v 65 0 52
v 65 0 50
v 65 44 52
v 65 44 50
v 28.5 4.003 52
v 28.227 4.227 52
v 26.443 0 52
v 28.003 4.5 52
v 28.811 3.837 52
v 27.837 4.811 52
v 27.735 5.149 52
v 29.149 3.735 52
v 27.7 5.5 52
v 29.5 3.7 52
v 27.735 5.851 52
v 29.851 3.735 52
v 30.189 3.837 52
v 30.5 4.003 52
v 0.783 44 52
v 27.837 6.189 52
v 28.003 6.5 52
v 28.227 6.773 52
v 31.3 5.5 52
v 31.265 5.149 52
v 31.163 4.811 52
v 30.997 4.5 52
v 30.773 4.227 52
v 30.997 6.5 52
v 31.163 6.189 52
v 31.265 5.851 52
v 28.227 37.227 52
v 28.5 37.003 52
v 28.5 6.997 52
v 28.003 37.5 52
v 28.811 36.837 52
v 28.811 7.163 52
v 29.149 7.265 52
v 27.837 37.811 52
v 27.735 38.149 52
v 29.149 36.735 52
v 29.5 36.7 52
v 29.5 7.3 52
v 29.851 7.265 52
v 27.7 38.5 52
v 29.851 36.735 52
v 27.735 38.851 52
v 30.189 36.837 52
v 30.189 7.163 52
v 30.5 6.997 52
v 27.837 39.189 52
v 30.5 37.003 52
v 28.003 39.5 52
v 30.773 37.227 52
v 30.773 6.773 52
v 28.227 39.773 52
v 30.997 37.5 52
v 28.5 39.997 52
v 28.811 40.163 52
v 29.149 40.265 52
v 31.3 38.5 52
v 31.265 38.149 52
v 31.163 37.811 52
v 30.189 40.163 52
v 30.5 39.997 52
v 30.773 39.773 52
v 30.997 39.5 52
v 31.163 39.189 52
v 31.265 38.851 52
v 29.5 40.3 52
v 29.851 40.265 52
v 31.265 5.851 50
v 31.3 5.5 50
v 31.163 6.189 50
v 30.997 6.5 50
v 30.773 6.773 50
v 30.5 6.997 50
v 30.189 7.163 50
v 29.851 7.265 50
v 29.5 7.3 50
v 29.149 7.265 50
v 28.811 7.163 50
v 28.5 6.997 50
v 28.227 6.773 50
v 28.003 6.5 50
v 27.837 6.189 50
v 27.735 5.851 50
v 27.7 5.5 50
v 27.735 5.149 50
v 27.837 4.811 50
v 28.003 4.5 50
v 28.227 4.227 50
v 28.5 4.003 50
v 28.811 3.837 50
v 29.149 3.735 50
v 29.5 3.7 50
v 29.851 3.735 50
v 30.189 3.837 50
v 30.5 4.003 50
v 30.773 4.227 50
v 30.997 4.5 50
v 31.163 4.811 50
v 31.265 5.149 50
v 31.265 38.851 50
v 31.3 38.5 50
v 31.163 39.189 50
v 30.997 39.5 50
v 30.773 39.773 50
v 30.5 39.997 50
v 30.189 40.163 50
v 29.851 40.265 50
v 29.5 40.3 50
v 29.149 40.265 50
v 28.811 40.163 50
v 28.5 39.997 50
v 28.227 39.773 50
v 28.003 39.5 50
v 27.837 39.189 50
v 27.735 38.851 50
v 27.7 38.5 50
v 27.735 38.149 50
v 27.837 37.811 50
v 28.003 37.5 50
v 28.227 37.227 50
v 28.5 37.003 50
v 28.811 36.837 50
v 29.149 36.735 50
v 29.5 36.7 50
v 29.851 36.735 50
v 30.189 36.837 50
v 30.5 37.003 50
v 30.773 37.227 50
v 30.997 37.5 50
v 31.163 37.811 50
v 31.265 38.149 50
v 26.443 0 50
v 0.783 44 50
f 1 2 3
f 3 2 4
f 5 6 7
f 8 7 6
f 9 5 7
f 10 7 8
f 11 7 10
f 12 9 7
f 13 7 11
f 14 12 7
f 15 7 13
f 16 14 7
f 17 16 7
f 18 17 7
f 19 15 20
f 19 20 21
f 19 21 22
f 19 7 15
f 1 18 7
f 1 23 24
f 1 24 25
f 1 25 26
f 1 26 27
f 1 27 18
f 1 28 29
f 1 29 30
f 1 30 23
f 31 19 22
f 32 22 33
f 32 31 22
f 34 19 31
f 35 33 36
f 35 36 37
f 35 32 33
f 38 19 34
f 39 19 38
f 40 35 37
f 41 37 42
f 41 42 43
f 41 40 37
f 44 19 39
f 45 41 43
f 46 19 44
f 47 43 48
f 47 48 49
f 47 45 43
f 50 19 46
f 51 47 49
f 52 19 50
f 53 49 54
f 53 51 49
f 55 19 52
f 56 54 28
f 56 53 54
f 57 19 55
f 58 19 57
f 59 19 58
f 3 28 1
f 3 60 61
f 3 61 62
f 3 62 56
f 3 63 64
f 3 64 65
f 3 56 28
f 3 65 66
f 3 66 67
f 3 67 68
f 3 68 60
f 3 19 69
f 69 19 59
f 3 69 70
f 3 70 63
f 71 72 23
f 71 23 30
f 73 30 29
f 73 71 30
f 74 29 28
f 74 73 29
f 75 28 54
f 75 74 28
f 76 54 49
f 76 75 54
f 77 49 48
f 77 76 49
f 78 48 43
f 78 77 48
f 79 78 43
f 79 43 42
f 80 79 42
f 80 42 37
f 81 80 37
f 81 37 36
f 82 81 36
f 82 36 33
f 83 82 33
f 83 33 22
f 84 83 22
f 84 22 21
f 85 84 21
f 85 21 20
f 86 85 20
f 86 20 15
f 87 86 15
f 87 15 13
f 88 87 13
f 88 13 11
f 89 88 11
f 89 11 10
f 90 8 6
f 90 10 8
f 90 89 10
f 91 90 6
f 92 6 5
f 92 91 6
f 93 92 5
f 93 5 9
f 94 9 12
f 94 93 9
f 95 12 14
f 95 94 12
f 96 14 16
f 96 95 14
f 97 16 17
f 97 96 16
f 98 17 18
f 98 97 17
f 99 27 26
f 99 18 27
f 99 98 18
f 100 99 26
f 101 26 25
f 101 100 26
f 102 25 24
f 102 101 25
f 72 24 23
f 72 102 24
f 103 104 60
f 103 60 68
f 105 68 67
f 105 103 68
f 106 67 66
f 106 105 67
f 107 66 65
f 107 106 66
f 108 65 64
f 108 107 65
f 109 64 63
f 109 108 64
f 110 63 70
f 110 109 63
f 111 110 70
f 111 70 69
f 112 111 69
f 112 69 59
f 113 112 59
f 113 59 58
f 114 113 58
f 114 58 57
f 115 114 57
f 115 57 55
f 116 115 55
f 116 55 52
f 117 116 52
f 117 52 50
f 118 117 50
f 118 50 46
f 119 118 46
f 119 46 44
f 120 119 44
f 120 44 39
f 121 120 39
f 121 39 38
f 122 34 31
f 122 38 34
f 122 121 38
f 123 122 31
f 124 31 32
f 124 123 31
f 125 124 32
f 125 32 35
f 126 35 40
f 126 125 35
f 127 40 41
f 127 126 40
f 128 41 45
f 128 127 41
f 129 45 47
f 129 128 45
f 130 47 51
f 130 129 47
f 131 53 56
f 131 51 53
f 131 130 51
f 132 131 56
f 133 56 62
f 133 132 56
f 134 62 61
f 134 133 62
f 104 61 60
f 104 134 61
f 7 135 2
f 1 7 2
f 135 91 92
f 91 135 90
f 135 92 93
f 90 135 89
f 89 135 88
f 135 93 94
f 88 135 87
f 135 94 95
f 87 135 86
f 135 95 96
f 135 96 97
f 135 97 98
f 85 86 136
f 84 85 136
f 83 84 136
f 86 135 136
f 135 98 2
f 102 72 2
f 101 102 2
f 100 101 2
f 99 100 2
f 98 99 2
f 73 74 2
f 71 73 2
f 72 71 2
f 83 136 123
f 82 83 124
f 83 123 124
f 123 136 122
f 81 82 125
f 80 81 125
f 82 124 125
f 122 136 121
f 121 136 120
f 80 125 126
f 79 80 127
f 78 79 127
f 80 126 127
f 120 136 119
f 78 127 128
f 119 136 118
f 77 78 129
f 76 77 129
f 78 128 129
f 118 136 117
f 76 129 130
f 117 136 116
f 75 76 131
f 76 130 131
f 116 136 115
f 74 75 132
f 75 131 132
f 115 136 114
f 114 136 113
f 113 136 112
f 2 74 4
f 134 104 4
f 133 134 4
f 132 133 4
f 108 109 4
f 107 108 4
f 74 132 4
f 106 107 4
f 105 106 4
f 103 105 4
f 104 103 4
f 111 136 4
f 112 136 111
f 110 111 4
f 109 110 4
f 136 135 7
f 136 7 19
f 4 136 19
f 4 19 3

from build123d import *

# Parameters (mm, degrees)
CYLINDER001_R          = 1.8
CYLINDER001_DEPTH      = 100
CYLINDER_R             = 1.8
CYLINDER_DEPTH         = 100
BOX001_W               = 25
BOX001_H               = 60
BOX001_DEPTH           = 25
BOX001_PLACEMENT_ANGLE = 30.25
BOX_W                  = 65
BOX_H                  = 44
BOX_DEPTH              = 2


with BuildPart() as zylinder001:
    # Cylinder001 → Cylinder001 (new body)
    with BuildSketch(Plane(origin=(29.5, 5.5, -6), x_dir=(1, 0, 0), z_dir=(0, 0, 1))):
        Circle(CYLINDER001_R)
    extrude(amount=CYLINDER001_DEPTH)


with BuildPart() as zylinder:
    # Cylinder → Cylinder (new body)
    with BuildSketch(Plane(origin=(29.5, 38.5, -6), x_dir=(1, 0, 0), z_dir=(0, 0, 1))):
        Circle(CYLINDER_R)
    extrude(amount=CYLINDER_DEPTH)


with BuildPart() as w_rfel001:
    # Box001 → Box001 (new body)
    with BuildSketch(Plane.XY):
        with Locations((12.5, 30)):
            Rectangle(BOX001_W, BOX001_H)
    extrude(amount=BOX001_DEPTH)


with BuildPart() as w_rfel001_1:
    # Box001 placement: moved
    add(w_rfel001.part.moved(Location((8, -18, 0))).rotate(Axis((8, -18, 0), (0, 0, 1)), BOX001_PLACEMENT_ANGLE))


with BuildPart() as cut008:
    # Box → Box (new body)
    with BuildSketch(Plane.XY):
        with Locations((32.5, 22)):
            Rectangle(BOX_W, BOX_H)
    extrude(amount=BOX_DEPTH)

    # Cut003: cut Würfel001
    add(w_rfel001_1.part, mode=Mode.SUBTRACT)


with BuildPart() as cut008_1:
    # Cut003 placement: moved
    add(cut008.part.moved(Location((0, 0, 50))))

    # Cut007: cut Zylinder
    add(zylinder.part, mode=Mode.SUBTRACT)

    # Cut008: cut Zylinder001
    add(zylinder001.part, mode=Mode.SUBTRACT)


solid = cut008_1.part
